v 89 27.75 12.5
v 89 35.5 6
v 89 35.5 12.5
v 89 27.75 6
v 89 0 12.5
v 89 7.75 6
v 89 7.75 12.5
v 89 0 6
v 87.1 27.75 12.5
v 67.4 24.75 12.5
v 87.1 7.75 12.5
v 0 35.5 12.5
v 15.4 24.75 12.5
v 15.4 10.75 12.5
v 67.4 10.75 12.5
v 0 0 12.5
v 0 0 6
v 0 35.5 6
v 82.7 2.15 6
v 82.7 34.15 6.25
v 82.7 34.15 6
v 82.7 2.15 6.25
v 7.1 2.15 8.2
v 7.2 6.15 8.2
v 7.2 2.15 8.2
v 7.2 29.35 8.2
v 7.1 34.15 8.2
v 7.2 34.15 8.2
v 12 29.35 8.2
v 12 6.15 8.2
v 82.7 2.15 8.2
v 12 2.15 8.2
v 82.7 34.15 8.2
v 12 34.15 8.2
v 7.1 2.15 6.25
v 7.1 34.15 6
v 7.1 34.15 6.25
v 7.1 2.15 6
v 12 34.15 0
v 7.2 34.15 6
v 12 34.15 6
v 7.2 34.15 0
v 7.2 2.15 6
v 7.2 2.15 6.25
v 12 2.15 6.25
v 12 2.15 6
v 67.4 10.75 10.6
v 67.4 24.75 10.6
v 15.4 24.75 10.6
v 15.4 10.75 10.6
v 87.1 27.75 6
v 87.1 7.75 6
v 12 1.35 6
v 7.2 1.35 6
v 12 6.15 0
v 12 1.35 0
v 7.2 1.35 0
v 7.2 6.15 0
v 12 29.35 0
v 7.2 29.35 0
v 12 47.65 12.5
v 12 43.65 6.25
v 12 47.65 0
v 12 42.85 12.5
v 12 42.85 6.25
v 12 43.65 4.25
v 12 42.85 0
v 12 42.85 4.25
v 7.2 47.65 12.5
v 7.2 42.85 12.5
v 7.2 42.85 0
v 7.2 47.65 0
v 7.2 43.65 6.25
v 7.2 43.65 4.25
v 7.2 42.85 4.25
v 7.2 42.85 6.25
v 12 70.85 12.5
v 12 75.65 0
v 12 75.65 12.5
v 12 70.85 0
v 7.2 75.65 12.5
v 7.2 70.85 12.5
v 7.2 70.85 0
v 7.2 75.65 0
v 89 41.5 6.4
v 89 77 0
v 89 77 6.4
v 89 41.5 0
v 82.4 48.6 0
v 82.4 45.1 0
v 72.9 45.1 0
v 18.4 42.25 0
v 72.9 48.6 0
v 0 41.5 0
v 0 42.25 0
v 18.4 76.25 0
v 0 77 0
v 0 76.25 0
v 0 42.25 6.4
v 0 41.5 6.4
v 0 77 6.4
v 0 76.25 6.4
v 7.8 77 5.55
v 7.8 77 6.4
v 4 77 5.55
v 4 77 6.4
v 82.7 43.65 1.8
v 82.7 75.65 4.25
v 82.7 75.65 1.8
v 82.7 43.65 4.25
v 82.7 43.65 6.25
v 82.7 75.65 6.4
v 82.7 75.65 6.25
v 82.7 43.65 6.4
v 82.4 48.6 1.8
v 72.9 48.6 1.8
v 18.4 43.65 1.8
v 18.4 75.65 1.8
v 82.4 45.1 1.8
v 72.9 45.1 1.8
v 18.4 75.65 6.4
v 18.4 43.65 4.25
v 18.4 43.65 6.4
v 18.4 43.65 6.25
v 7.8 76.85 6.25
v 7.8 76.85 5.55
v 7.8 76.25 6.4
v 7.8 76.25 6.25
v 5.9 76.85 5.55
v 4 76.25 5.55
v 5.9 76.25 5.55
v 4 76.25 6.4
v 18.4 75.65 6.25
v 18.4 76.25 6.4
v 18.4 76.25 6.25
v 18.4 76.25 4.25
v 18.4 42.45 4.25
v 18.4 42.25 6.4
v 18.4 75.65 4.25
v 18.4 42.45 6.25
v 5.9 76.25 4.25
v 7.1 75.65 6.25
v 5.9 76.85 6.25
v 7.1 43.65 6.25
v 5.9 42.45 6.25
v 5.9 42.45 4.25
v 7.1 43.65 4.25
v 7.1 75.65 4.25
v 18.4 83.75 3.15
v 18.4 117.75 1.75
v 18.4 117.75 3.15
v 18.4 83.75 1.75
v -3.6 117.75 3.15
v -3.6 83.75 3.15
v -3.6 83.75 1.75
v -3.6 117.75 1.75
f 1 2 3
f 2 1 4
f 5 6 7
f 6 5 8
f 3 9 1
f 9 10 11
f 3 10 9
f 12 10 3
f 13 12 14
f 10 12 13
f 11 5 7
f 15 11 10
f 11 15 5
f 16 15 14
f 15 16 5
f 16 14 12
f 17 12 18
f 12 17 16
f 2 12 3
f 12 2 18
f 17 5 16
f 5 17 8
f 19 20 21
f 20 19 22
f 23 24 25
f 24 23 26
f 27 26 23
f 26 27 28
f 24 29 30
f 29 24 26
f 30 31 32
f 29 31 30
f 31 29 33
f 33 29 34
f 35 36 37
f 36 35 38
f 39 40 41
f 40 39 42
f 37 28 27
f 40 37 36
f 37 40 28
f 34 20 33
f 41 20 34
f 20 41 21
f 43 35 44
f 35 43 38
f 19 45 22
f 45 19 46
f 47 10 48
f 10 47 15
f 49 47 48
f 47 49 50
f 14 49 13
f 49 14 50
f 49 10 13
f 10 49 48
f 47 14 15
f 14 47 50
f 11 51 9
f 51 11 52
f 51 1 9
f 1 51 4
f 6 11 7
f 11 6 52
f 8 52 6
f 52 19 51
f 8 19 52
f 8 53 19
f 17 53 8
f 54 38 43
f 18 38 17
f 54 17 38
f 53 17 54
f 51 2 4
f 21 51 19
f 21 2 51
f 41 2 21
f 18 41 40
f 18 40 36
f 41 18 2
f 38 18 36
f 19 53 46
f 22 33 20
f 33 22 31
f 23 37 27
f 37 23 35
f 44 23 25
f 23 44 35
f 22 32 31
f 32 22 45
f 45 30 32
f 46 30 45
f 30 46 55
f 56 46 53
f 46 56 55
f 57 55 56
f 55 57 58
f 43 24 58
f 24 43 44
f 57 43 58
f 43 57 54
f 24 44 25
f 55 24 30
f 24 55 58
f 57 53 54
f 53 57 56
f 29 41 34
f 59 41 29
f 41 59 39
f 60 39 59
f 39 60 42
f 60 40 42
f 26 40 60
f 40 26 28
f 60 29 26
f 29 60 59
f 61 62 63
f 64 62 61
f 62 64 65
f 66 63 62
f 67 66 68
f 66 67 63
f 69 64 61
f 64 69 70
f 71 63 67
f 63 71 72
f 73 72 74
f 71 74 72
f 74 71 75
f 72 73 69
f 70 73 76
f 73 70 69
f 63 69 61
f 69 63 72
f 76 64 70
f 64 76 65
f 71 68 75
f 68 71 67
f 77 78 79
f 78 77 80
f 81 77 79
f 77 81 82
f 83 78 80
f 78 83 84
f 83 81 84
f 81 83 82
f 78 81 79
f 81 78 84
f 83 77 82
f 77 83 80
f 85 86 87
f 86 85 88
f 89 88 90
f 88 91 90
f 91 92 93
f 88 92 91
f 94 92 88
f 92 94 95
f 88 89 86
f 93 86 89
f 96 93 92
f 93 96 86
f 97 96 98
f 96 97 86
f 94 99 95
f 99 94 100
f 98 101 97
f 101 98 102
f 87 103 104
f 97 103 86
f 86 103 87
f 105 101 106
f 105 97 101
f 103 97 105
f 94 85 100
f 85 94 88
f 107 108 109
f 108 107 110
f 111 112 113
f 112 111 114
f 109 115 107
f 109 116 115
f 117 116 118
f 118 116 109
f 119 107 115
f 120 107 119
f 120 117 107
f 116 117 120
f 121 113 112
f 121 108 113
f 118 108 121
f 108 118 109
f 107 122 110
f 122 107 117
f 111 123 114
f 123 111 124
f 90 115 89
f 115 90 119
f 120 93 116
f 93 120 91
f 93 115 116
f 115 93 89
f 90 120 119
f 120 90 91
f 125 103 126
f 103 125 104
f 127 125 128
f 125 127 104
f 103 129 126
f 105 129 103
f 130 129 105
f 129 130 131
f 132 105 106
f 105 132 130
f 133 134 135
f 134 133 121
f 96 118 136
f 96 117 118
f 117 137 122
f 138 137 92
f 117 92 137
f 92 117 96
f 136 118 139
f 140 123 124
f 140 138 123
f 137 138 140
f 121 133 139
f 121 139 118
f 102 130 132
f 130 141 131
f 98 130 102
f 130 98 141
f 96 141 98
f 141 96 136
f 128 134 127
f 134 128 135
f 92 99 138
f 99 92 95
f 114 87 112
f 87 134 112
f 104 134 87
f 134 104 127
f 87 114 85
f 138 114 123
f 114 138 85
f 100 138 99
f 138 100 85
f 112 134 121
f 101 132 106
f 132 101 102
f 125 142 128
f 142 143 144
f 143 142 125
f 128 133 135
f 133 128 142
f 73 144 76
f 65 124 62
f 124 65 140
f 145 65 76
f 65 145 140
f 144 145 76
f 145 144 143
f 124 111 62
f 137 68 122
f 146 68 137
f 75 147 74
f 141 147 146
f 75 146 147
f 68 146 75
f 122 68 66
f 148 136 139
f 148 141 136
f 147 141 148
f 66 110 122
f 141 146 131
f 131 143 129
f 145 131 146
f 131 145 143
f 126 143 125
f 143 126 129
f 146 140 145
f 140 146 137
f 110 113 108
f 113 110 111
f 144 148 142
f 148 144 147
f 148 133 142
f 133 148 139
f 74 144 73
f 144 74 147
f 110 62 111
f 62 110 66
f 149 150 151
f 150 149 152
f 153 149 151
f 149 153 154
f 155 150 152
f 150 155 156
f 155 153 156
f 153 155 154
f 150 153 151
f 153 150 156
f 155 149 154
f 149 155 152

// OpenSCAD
// Mooltipass Mini BLE — service shell (two-part clam shell)
// Coordinate system: origin at bottom-left-back corner of the case.
//   +X = toward scroll wheel end (89 mm)
//   +Y = toward smartcard edge (35.5 mm)
//   +Z = toward display face (12.5 mm)
//
// Dimensions derived from minible_hw KiCad (see docs/dimensions.md).
// Run: ./case/export-stl.sh

part = "both";          // "front" | "back" | "both" | "battery_door"

// --- case envelope ---
case_l = 89.0;
case_w = 35.5;
case_h = 12.5;
wall = 1.8;
clearance = 0.4;
corner_r = 3.0;

// --- PCB pocket ---
pcb_l = 74.8;
pcb_w = 31.2;
pcb_h = 6.0;            // verify stack height on hardware
margin_x = (case_l - pcb_l) / 2;   // 7.1
margin_y = (case_w - pcb_w) / 2;   // 2.15

// --- feature positions (case coords, mm) ---
usb_x = 72.9;
usb_y = 5.35;
usb_open_w = 9.5;
usb_open_h = 3.5;

wheel_x = 78.4;
wheel_y = 17.75;
wheel_bore_d = 20.0;

oled_cx = 41.4;         // approx. center of 52 mm active area
oled_cy = 17.75;
oled_w = 52.0;
oled_h = 14.0;

card_x = 4.0;
card_y = 29.3;
card_slot_w = 24.0;
card_slot_h = 1.4;

battery_cx = 7.4;
battery_cy = 17.75;
battery_door_w = 22.0;
battery_door_h = 34.0;

mount_j1 = [9.6, 3.75];
mount_j2 = [9.6, 31.75];
mount_d = 1.6;          // M1.4 screw clearance

lip_depth = 2.0;
lip_inset = 1.2;
split_gap = 0.25;
screw_post_d = 4.8;

inner_l = pcb_l + 2 * clearance;
inner_w = pcb_w + 2 * clearance;
inner_h = pcb_h + clearance;

module rounded_box(l, w, h, r) {
    // Simple chamfered box — avoids heavy minkowski() in headless export.
    cube([l, w, h]);
}

module pcb_cavity() {
    translate([margin_x, margin_y, wall])
        cube([inner_l, inner_w, inner_h]);
}

module usb_port() {
    translate([usb_x, usb_y - usb_open_h / 2, -0.1])
        cube([usb_open_w, usb_open_h, wall + 0.2]);
}

module wheel_bore() {
    translate([case_l - wall - 0.1, wheel_y - wheel_bore_d / 2, case_h / 2 - wheel_bore_d / 2])
        cube([wall + 0.2, wheel_bore_d, wheel_bore_d]);
}

module display_window() {
    translate([oled_cx - oled_w / 2, oled_cy - oled_h / 2, case_h - wall - 0.1])
        cube([oled_w, oled_h, wall + 0.2]);
}

module card_slot() {
    translate([card_x, card_y - card_slot_w / 2, case_h / 2 - card_slot_h / 2])
        cube([wall + 2, card_slot_w, card_slot_h + 0.2]);
}

module mount_posts() {
    for (p = [mount_j1, mount_j2])
        translate([p[0] - screw_post_d / 2, p[1] - screw_post_d / 2, 0])
            cube([screw_post_d, screw_post_d, case_h]);
}

module mount_holes() {
    for (p = [mount_j1, mount_j2])
        translate([p[0] - mount_d / 2, p[1] - mount_d / 2, -0.1])
            cube([mount_d, mount_d, case_h + 0.2]);
}

module mating_lip(top = true) {
    z0 = top ? case_h / 2 : case_h / 2 - lip_depth;
    translate([margin_x - lip_inset, margin_y - lip_inset, z0])
        difference() {
            cube([inner_l + 2 * lip_inset, inner_w + 2 * lip_inset, lip_depth]);
            translate([lip_inset, lip_inset, -0.1])
                cube([inner_l, inner_w, lip_depth + 0.2]);
        }
}

module top_shell() {
    intersection() {
        difference() {
            rounded_box(case_l, case_w, case_h, corner_r);
            pcb_cavity();
            display_window();
            wheel_bore();
            mount_holes();
        }
        translate([-0.1, -0.1, case_h / 2 - split_gap])
            cube([case_l + 0.2, case_w + 0.2, case_h / 2 + split_gap]);
    }
    mating_lip(true);
    mount_posts();
}

module bottom_shell() {
    intersection() {
        difference() {
            rounded_box(case_l, case_w, case_h, corner_r);
            pcb_cavity();
            usb_port();
            card_slot();
            mount_holes();
            battery_access_cut();
        }
        translate([-0.1, -0.1, -0.1])
            cube([case_l + 0.2, case_w + 0.2, case_h / 2 + split_gap]);
    }
    mating_lip(false);
    mount_posts();
}

module battery_access_cut() {
    // Pocket under BT1 for future swaps without splitting the whole shell.
    translate([battery_cx - battery_door_w / 2, battery_cy - battery_door_h / 2, -0.1])
        cube([battery_door_w, battery_door_h, wall + inner_h + 0.5]);
}

module battery_door() {
  t = 1.4;
  translate([battery_cx - battery_door_w / 2, battery_cy - battery_door_h / 2, wall - 0.05])
    cube([battery_door_w, battery_door_h, t]);
}

if (part == "front" || part == "top") {
    top_shell();
} else if (part == "back" || part == "bottom") {
    bottom_shell();
} else if (part == "battery_door") {
    battery_door();
} else {
    color("Gainsboro") top_shell();
    translate([0, case_w + 6, 0]) color("DimGray") bottom_shell();
    translate([0, 2 * (case_w + 6), 0]) color("Silver") battery_door();
}
